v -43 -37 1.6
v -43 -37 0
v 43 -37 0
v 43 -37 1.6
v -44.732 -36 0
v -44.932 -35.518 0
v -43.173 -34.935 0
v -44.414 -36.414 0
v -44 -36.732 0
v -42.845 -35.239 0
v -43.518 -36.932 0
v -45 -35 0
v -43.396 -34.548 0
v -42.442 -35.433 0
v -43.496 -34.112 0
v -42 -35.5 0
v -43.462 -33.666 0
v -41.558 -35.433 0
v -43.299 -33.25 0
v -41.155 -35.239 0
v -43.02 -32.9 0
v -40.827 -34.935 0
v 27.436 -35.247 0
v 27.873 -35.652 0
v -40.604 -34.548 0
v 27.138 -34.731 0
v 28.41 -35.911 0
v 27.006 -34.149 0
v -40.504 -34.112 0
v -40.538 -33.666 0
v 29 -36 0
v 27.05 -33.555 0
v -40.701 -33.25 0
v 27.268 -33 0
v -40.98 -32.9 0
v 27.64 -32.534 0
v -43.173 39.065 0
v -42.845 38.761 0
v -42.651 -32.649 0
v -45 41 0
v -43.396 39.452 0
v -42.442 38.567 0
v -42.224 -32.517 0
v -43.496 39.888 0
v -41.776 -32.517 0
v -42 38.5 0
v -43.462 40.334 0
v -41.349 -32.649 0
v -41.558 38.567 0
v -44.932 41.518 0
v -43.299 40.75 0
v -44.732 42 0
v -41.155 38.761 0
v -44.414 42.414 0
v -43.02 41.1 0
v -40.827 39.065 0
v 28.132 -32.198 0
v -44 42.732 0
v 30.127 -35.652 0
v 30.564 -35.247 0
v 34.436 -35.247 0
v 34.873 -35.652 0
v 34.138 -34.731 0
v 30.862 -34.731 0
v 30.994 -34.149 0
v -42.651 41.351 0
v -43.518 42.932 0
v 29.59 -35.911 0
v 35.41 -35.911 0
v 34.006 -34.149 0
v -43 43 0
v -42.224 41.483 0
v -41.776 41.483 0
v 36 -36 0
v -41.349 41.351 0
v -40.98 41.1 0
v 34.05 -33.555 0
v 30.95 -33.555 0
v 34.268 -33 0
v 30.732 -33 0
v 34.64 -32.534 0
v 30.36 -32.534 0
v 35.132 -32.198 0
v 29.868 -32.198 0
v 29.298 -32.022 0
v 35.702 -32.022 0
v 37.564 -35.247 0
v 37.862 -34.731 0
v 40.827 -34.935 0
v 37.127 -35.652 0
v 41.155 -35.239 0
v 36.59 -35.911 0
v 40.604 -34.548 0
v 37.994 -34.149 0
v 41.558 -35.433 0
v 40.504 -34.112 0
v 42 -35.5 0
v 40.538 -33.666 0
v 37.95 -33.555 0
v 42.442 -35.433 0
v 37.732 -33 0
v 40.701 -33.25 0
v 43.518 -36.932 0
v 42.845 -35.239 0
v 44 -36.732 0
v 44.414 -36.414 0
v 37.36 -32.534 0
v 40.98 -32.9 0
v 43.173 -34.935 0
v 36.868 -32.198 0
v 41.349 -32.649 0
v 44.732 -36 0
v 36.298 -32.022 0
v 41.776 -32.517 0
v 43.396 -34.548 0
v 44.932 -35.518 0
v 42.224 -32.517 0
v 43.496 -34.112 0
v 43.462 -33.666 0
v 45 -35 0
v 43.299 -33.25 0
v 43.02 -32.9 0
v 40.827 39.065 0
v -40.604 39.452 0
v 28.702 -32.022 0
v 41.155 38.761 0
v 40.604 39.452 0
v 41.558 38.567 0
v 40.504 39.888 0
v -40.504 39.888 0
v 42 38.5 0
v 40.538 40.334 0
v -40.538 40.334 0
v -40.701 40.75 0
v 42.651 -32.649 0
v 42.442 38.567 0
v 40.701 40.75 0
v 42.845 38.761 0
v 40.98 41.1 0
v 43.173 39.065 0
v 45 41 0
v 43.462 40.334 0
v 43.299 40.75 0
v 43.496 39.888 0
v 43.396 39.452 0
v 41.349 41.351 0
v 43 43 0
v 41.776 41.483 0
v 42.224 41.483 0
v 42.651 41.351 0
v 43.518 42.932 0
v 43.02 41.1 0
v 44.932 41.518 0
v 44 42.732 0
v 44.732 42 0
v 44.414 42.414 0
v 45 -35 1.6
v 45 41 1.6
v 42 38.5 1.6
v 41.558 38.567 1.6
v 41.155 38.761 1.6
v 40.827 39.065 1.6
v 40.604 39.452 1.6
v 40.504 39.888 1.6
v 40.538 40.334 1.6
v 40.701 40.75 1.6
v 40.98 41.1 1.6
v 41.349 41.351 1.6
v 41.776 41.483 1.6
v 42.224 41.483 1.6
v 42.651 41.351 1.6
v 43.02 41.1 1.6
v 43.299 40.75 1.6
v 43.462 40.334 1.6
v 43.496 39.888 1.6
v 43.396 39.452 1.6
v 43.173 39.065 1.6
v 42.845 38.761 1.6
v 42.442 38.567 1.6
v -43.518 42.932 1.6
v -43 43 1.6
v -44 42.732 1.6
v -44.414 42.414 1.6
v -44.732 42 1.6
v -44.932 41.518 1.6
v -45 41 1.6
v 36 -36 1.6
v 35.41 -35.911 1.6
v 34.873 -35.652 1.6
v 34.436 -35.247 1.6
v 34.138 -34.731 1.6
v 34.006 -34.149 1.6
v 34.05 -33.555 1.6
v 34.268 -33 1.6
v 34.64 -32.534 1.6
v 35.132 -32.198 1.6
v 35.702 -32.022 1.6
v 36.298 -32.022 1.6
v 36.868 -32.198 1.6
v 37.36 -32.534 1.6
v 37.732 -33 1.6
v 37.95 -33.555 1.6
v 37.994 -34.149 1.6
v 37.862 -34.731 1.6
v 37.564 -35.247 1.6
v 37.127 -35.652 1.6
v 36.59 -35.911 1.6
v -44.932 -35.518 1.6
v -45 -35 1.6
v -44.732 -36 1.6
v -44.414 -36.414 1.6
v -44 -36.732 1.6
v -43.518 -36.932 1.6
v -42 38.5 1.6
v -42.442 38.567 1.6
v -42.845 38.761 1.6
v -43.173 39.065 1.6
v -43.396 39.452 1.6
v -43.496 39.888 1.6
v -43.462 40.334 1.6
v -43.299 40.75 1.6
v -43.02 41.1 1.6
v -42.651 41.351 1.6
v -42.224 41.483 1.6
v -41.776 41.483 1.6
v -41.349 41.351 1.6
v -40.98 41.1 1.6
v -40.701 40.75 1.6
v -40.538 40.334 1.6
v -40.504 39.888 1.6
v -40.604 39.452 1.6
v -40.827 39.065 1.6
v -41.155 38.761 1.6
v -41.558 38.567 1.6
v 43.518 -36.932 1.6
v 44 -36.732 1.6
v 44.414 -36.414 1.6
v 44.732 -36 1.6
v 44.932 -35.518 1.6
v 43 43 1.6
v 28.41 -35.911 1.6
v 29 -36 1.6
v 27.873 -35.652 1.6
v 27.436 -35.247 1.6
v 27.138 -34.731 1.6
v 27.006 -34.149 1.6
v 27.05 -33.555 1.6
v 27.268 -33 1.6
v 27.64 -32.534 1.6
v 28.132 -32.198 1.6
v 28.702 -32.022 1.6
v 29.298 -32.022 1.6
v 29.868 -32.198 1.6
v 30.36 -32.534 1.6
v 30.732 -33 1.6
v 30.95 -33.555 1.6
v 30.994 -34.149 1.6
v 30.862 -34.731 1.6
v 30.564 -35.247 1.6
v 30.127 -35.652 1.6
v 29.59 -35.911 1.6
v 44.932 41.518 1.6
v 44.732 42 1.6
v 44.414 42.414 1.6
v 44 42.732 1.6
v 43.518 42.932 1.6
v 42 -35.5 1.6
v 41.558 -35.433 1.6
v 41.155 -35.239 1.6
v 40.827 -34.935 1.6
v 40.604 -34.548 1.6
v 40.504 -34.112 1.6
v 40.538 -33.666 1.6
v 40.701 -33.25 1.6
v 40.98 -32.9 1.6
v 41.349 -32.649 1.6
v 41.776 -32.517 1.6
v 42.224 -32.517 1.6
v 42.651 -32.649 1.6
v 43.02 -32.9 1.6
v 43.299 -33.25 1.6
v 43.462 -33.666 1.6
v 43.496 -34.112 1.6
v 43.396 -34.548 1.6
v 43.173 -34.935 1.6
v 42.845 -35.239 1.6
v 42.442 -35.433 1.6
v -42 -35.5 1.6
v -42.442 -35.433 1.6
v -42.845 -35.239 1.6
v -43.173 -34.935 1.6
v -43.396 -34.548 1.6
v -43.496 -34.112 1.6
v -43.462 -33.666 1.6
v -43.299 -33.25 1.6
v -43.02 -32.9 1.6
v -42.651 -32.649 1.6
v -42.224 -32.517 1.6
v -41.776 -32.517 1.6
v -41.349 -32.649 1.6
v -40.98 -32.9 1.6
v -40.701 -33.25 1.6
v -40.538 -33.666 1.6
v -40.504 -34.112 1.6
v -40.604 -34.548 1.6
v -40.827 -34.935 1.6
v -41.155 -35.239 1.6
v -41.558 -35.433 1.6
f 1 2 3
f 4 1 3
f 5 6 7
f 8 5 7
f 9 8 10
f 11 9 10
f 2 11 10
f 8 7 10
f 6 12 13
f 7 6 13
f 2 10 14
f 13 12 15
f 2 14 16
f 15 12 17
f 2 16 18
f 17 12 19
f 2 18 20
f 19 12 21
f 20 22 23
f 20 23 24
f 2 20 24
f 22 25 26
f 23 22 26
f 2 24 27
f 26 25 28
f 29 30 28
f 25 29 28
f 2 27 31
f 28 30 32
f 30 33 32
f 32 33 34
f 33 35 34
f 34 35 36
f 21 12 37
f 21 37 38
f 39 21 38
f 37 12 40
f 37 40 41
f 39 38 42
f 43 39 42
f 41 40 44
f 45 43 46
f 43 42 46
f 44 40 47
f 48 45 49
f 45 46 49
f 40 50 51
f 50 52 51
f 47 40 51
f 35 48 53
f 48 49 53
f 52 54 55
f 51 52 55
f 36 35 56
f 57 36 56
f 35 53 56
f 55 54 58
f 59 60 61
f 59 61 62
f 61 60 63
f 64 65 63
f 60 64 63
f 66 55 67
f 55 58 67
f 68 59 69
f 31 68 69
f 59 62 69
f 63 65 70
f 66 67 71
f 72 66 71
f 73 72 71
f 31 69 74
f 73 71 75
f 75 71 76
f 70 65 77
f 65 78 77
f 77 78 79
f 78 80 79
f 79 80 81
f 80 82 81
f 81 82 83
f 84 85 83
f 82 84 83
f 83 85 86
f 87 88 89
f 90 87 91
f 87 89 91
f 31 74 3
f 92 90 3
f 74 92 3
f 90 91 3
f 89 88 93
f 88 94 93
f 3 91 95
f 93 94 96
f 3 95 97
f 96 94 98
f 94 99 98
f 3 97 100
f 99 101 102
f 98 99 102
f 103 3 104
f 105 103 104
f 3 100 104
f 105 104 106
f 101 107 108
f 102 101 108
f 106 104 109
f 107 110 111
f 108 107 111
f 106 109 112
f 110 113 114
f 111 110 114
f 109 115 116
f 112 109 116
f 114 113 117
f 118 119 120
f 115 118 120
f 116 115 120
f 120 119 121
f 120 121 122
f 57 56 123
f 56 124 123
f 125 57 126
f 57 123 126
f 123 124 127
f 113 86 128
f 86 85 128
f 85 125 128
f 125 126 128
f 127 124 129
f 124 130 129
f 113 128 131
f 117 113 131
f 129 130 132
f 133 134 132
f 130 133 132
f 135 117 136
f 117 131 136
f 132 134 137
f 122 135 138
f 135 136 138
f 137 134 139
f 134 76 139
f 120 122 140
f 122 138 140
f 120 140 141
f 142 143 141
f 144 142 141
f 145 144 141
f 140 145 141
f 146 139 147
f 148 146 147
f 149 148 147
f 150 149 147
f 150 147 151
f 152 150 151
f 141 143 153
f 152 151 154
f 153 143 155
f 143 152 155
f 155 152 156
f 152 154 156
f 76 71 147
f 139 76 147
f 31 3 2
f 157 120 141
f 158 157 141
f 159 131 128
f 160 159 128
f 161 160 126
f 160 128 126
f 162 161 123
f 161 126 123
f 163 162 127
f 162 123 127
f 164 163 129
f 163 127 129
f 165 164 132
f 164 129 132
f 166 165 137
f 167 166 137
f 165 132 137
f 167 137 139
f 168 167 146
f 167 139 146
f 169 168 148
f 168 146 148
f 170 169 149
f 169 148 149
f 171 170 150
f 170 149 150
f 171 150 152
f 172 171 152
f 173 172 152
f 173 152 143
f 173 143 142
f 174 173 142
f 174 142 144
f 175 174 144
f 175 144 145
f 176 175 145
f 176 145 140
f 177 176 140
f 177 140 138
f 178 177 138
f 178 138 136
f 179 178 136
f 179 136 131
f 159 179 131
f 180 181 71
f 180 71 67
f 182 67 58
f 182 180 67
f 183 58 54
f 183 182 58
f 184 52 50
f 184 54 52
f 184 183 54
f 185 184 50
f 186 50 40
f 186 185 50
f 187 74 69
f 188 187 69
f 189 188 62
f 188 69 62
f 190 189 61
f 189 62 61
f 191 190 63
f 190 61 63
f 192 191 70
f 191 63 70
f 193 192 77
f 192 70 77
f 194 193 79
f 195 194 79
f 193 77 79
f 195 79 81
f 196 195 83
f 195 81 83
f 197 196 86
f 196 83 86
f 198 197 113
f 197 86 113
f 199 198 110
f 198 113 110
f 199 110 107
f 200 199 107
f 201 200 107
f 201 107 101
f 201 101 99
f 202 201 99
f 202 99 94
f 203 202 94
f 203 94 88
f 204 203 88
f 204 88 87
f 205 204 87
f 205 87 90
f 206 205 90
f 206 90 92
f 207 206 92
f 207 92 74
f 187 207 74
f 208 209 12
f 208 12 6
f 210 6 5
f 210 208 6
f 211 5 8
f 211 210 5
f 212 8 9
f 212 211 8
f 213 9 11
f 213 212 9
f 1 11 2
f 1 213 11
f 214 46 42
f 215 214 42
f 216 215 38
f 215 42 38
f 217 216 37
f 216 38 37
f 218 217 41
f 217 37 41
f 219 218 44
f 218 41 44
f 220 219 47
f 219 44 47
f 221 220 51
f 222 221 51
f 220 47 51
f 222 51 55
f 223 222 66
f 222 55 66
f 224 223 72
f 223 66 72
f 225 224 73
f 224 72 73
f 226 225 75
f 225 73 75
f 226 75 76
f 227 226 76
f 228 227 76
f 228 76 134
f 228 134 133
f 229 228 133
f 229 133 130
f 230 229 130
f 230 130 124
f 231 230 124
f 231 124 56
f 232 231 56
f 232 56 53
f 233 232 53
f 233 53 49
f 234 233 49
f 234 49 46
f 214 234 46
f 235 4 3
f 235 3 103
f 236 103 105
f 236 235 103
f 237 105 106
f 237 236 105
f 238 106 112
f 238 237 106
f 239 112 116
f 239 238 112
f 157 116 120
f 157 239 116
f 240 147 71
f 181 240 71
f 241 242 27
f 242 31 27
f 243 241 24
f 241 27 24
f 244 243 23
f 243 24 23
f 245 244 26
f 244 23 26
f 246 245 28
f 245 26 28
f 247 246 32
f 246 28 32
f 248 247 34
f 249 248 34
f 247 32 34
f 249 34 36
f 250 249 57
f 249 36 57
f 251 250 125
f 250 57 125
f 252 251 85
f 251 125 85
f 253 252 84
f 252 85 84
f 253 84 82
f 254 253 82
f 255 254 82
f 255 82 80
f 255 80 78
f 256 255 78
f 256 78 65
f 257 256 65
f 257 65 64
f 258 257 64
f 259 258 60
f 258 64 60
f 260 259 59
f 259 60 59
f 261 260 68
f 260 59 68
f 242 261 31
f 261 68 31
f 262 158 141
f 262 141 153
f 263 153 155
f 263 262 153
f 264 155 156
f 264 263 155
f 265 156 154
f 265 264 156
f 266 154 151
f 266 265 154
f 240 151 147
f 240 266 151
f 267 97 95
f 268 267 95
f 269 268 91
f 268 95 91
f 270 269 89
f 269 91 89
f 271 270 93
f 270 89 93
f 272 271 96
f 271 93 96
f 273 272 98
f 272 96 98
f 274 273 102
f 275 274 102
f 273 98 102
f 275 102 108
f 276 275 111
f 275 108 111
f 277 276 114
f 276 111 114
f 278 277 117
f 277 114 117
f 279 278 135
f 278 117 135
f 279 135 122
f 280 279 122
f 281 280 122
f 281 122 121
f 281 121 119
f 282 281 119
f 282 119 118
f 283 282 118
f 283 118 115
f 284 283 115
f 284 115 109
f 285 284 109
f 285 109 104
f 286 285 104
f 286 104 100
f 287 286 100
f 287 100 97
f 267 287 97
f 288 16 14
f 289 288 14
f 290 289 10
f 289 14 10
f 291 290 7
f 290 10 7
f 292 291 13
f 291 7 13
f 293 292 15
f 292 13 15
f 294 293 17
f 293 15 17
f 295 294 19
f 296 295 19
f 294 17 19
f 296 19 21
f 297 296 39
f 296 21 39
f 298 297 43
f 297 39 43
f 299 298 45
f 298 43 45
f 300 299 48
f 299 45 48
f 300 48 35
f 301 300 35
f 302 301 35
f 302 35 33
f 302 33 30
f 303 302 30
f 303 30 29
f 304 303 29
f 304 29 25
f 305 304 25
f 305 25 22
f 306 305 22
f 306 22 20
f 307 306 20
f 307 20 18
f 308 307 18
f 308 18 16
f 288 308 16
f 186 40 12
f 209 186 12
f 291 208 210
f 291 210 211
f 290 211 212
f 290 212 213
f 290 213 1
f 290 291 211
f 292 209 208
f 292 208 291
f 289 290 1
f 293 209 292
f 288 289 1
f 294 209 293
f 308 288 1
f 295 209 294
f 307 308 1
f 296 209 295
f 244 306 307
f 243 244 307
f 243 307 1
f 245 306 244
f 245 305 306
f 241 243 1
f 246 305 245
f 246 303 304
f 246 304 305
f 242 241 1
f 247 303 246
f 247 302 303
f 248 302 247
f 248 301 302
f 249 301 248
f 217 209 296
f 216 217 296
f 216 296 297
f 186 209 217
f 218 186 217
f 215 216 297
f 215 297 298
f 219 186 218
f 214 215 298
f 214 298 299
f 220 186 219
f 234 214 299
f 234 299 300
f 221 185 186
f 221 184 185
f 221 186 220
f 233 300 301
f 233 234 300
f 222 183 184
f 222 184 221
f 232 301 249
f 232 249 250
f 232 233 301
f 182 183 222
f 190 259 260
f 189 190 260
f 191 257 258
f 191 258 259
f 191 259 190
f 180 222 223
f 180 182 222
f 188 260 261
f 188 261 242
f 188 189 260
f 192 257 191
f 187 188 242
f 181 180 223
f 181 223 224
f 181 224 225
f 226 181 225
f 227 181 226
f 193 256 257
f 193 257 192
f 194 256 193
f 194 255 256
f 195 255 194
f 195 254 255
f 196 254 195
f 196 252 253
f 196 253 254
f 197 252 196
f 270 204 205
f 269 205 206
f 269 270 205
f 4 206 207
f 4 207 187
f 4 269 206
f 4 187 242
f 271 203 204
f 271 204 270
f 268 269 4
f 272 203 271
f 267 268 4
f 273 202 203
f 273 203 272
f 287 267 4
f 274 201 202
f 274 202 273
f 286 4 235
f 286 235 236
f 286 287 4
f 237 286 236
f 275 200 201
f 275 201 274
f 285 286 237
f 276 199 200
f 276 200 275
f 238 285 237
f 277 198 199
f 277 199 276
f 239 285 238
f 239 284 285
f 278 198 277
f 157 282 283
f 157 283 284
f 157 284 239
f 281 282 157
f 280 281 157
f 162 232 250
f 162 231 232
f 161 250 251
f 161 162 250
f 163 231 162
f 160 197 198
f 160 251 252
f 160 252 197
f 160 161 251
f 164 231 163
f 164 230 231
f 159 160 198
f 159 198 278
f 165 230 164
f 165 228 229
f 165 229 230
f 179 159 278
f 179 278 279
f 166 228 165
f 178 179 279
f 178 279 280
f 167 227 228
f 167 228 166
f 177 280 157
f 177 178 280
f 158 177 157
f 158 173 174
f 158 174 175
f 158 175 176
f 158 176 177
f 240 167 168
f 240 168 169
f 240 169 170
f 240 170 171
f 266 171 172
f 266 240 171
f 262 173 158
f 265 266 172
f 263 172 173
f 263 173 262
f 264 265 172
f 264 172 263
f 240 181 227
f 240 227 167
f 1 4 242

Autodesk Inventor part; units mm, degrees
ref_plane "YZ Plane" through (0, 0, 0) normal (1, 0, 0) x (0, 1, 0)
ref_plane "XZ Plane" through (0, 0, 0) normal (0, 1, 0) x (-1, 0, 0)
ref_plane "XY Plane" through (0, 0, 0) normal (0, 0, 1) x (1, 0, 0)
sketch "Skizze1" plane through (0, 0, 0) normal (0, 0, 1) x (1, 0, 0)
  line L0 (-45, -37) -> (45, -37)
  line L1 (45, -37) -> (45, 43)
  line L2 (45, 43) -> (-45, 43)
  line L3 (-45, 43) -> (-45, -37)
  line L4 (0, 59) -> (0, -53) projected
  point P0 (0, 0)
  dimension "d0" = 90
  dimension "d2" = 37
  dimension "d14" = 80
extrude "Extrusion1" add sketch "Skizze1" along normal blind 1.6
sketch "Skizze2" plane through (0, 0, 1.6) normal (0, 0, 1) x (1, 0, 0)
  line L0 (-45, -37) -> (45, -37) projected
  line L1 (45, -37) -> (45, 43) projected
  line L2 (45, 43) -> (-45, 43) projected
  line L3 (-45, 43) -> (-45, -37) projected
  line L4 (-42, -34) -> (42, -34)
  line L5 (42, -34) -> (42, 40)
  line L6 (42, 40) -> (-42, 40)
  line L7 (-42, 40) -> (-42, -34)
  line L8 (0, 59) -> (0, -53) projected
  point P0 (0, 0)
  point P1 (42, -34)
  dimension "d5" = 3
hole "Montage" at (-42, 40, 1.6) at (42, 40, 1.6) at (42, -34, 1.6) at (-42, -34, 1.6) direction (0, 0, -1) diameter 3 end through all
sketch "Skizze3" plane through (0, 0, 1.6) normal (0, 0, 1) x (1, 0, 0)
  line L0 (29, -34) -> (36, -34) construction
  circle A0 centre (42, 40) radius 1.5 projected
  circle A1 centre (-42, 40) radius 1.5 projected
  circle A2 centre (42, -34) radius 1.5 projected
  line L1 (-45, -37) -> (45, -37) projected
  line L2 (45, -37) -> (45, 43) projected
  line L3 (45, 43) -> (-45, 43) projected
  line L4 (-45, 43) -> (-45, -37) projected
  point P0 (0, 0)
  dimension "d27" = 7
  dimension "d29" = 3
  dimension "d30" = 9
hole "Akku" at (36, -34, 1.6) at (29, -34, 1.6) direction (0, 0, -1) diameter 4 end through all
sketch "Skizze4" plane through (0, 0, 1.6) normal (0, 0, 1) x (1, 0, 0)
  circle A0 centre (29, -34) radius 2 projected
sketch "Skizze5" plane through (0, 0, 1.6) normal (0, 0, 1) x (1, 0, 0)
  circle A0 centre (36, -34) radius 2 projected
fillet "Rundung3" radius 2 4 edges at (45, -37, 0.8) (45, 43, 0.8) (-45, 43, 0.8) (-45, -37, 0.8)
properties part number "Powerboard" material "Phenolharz"
